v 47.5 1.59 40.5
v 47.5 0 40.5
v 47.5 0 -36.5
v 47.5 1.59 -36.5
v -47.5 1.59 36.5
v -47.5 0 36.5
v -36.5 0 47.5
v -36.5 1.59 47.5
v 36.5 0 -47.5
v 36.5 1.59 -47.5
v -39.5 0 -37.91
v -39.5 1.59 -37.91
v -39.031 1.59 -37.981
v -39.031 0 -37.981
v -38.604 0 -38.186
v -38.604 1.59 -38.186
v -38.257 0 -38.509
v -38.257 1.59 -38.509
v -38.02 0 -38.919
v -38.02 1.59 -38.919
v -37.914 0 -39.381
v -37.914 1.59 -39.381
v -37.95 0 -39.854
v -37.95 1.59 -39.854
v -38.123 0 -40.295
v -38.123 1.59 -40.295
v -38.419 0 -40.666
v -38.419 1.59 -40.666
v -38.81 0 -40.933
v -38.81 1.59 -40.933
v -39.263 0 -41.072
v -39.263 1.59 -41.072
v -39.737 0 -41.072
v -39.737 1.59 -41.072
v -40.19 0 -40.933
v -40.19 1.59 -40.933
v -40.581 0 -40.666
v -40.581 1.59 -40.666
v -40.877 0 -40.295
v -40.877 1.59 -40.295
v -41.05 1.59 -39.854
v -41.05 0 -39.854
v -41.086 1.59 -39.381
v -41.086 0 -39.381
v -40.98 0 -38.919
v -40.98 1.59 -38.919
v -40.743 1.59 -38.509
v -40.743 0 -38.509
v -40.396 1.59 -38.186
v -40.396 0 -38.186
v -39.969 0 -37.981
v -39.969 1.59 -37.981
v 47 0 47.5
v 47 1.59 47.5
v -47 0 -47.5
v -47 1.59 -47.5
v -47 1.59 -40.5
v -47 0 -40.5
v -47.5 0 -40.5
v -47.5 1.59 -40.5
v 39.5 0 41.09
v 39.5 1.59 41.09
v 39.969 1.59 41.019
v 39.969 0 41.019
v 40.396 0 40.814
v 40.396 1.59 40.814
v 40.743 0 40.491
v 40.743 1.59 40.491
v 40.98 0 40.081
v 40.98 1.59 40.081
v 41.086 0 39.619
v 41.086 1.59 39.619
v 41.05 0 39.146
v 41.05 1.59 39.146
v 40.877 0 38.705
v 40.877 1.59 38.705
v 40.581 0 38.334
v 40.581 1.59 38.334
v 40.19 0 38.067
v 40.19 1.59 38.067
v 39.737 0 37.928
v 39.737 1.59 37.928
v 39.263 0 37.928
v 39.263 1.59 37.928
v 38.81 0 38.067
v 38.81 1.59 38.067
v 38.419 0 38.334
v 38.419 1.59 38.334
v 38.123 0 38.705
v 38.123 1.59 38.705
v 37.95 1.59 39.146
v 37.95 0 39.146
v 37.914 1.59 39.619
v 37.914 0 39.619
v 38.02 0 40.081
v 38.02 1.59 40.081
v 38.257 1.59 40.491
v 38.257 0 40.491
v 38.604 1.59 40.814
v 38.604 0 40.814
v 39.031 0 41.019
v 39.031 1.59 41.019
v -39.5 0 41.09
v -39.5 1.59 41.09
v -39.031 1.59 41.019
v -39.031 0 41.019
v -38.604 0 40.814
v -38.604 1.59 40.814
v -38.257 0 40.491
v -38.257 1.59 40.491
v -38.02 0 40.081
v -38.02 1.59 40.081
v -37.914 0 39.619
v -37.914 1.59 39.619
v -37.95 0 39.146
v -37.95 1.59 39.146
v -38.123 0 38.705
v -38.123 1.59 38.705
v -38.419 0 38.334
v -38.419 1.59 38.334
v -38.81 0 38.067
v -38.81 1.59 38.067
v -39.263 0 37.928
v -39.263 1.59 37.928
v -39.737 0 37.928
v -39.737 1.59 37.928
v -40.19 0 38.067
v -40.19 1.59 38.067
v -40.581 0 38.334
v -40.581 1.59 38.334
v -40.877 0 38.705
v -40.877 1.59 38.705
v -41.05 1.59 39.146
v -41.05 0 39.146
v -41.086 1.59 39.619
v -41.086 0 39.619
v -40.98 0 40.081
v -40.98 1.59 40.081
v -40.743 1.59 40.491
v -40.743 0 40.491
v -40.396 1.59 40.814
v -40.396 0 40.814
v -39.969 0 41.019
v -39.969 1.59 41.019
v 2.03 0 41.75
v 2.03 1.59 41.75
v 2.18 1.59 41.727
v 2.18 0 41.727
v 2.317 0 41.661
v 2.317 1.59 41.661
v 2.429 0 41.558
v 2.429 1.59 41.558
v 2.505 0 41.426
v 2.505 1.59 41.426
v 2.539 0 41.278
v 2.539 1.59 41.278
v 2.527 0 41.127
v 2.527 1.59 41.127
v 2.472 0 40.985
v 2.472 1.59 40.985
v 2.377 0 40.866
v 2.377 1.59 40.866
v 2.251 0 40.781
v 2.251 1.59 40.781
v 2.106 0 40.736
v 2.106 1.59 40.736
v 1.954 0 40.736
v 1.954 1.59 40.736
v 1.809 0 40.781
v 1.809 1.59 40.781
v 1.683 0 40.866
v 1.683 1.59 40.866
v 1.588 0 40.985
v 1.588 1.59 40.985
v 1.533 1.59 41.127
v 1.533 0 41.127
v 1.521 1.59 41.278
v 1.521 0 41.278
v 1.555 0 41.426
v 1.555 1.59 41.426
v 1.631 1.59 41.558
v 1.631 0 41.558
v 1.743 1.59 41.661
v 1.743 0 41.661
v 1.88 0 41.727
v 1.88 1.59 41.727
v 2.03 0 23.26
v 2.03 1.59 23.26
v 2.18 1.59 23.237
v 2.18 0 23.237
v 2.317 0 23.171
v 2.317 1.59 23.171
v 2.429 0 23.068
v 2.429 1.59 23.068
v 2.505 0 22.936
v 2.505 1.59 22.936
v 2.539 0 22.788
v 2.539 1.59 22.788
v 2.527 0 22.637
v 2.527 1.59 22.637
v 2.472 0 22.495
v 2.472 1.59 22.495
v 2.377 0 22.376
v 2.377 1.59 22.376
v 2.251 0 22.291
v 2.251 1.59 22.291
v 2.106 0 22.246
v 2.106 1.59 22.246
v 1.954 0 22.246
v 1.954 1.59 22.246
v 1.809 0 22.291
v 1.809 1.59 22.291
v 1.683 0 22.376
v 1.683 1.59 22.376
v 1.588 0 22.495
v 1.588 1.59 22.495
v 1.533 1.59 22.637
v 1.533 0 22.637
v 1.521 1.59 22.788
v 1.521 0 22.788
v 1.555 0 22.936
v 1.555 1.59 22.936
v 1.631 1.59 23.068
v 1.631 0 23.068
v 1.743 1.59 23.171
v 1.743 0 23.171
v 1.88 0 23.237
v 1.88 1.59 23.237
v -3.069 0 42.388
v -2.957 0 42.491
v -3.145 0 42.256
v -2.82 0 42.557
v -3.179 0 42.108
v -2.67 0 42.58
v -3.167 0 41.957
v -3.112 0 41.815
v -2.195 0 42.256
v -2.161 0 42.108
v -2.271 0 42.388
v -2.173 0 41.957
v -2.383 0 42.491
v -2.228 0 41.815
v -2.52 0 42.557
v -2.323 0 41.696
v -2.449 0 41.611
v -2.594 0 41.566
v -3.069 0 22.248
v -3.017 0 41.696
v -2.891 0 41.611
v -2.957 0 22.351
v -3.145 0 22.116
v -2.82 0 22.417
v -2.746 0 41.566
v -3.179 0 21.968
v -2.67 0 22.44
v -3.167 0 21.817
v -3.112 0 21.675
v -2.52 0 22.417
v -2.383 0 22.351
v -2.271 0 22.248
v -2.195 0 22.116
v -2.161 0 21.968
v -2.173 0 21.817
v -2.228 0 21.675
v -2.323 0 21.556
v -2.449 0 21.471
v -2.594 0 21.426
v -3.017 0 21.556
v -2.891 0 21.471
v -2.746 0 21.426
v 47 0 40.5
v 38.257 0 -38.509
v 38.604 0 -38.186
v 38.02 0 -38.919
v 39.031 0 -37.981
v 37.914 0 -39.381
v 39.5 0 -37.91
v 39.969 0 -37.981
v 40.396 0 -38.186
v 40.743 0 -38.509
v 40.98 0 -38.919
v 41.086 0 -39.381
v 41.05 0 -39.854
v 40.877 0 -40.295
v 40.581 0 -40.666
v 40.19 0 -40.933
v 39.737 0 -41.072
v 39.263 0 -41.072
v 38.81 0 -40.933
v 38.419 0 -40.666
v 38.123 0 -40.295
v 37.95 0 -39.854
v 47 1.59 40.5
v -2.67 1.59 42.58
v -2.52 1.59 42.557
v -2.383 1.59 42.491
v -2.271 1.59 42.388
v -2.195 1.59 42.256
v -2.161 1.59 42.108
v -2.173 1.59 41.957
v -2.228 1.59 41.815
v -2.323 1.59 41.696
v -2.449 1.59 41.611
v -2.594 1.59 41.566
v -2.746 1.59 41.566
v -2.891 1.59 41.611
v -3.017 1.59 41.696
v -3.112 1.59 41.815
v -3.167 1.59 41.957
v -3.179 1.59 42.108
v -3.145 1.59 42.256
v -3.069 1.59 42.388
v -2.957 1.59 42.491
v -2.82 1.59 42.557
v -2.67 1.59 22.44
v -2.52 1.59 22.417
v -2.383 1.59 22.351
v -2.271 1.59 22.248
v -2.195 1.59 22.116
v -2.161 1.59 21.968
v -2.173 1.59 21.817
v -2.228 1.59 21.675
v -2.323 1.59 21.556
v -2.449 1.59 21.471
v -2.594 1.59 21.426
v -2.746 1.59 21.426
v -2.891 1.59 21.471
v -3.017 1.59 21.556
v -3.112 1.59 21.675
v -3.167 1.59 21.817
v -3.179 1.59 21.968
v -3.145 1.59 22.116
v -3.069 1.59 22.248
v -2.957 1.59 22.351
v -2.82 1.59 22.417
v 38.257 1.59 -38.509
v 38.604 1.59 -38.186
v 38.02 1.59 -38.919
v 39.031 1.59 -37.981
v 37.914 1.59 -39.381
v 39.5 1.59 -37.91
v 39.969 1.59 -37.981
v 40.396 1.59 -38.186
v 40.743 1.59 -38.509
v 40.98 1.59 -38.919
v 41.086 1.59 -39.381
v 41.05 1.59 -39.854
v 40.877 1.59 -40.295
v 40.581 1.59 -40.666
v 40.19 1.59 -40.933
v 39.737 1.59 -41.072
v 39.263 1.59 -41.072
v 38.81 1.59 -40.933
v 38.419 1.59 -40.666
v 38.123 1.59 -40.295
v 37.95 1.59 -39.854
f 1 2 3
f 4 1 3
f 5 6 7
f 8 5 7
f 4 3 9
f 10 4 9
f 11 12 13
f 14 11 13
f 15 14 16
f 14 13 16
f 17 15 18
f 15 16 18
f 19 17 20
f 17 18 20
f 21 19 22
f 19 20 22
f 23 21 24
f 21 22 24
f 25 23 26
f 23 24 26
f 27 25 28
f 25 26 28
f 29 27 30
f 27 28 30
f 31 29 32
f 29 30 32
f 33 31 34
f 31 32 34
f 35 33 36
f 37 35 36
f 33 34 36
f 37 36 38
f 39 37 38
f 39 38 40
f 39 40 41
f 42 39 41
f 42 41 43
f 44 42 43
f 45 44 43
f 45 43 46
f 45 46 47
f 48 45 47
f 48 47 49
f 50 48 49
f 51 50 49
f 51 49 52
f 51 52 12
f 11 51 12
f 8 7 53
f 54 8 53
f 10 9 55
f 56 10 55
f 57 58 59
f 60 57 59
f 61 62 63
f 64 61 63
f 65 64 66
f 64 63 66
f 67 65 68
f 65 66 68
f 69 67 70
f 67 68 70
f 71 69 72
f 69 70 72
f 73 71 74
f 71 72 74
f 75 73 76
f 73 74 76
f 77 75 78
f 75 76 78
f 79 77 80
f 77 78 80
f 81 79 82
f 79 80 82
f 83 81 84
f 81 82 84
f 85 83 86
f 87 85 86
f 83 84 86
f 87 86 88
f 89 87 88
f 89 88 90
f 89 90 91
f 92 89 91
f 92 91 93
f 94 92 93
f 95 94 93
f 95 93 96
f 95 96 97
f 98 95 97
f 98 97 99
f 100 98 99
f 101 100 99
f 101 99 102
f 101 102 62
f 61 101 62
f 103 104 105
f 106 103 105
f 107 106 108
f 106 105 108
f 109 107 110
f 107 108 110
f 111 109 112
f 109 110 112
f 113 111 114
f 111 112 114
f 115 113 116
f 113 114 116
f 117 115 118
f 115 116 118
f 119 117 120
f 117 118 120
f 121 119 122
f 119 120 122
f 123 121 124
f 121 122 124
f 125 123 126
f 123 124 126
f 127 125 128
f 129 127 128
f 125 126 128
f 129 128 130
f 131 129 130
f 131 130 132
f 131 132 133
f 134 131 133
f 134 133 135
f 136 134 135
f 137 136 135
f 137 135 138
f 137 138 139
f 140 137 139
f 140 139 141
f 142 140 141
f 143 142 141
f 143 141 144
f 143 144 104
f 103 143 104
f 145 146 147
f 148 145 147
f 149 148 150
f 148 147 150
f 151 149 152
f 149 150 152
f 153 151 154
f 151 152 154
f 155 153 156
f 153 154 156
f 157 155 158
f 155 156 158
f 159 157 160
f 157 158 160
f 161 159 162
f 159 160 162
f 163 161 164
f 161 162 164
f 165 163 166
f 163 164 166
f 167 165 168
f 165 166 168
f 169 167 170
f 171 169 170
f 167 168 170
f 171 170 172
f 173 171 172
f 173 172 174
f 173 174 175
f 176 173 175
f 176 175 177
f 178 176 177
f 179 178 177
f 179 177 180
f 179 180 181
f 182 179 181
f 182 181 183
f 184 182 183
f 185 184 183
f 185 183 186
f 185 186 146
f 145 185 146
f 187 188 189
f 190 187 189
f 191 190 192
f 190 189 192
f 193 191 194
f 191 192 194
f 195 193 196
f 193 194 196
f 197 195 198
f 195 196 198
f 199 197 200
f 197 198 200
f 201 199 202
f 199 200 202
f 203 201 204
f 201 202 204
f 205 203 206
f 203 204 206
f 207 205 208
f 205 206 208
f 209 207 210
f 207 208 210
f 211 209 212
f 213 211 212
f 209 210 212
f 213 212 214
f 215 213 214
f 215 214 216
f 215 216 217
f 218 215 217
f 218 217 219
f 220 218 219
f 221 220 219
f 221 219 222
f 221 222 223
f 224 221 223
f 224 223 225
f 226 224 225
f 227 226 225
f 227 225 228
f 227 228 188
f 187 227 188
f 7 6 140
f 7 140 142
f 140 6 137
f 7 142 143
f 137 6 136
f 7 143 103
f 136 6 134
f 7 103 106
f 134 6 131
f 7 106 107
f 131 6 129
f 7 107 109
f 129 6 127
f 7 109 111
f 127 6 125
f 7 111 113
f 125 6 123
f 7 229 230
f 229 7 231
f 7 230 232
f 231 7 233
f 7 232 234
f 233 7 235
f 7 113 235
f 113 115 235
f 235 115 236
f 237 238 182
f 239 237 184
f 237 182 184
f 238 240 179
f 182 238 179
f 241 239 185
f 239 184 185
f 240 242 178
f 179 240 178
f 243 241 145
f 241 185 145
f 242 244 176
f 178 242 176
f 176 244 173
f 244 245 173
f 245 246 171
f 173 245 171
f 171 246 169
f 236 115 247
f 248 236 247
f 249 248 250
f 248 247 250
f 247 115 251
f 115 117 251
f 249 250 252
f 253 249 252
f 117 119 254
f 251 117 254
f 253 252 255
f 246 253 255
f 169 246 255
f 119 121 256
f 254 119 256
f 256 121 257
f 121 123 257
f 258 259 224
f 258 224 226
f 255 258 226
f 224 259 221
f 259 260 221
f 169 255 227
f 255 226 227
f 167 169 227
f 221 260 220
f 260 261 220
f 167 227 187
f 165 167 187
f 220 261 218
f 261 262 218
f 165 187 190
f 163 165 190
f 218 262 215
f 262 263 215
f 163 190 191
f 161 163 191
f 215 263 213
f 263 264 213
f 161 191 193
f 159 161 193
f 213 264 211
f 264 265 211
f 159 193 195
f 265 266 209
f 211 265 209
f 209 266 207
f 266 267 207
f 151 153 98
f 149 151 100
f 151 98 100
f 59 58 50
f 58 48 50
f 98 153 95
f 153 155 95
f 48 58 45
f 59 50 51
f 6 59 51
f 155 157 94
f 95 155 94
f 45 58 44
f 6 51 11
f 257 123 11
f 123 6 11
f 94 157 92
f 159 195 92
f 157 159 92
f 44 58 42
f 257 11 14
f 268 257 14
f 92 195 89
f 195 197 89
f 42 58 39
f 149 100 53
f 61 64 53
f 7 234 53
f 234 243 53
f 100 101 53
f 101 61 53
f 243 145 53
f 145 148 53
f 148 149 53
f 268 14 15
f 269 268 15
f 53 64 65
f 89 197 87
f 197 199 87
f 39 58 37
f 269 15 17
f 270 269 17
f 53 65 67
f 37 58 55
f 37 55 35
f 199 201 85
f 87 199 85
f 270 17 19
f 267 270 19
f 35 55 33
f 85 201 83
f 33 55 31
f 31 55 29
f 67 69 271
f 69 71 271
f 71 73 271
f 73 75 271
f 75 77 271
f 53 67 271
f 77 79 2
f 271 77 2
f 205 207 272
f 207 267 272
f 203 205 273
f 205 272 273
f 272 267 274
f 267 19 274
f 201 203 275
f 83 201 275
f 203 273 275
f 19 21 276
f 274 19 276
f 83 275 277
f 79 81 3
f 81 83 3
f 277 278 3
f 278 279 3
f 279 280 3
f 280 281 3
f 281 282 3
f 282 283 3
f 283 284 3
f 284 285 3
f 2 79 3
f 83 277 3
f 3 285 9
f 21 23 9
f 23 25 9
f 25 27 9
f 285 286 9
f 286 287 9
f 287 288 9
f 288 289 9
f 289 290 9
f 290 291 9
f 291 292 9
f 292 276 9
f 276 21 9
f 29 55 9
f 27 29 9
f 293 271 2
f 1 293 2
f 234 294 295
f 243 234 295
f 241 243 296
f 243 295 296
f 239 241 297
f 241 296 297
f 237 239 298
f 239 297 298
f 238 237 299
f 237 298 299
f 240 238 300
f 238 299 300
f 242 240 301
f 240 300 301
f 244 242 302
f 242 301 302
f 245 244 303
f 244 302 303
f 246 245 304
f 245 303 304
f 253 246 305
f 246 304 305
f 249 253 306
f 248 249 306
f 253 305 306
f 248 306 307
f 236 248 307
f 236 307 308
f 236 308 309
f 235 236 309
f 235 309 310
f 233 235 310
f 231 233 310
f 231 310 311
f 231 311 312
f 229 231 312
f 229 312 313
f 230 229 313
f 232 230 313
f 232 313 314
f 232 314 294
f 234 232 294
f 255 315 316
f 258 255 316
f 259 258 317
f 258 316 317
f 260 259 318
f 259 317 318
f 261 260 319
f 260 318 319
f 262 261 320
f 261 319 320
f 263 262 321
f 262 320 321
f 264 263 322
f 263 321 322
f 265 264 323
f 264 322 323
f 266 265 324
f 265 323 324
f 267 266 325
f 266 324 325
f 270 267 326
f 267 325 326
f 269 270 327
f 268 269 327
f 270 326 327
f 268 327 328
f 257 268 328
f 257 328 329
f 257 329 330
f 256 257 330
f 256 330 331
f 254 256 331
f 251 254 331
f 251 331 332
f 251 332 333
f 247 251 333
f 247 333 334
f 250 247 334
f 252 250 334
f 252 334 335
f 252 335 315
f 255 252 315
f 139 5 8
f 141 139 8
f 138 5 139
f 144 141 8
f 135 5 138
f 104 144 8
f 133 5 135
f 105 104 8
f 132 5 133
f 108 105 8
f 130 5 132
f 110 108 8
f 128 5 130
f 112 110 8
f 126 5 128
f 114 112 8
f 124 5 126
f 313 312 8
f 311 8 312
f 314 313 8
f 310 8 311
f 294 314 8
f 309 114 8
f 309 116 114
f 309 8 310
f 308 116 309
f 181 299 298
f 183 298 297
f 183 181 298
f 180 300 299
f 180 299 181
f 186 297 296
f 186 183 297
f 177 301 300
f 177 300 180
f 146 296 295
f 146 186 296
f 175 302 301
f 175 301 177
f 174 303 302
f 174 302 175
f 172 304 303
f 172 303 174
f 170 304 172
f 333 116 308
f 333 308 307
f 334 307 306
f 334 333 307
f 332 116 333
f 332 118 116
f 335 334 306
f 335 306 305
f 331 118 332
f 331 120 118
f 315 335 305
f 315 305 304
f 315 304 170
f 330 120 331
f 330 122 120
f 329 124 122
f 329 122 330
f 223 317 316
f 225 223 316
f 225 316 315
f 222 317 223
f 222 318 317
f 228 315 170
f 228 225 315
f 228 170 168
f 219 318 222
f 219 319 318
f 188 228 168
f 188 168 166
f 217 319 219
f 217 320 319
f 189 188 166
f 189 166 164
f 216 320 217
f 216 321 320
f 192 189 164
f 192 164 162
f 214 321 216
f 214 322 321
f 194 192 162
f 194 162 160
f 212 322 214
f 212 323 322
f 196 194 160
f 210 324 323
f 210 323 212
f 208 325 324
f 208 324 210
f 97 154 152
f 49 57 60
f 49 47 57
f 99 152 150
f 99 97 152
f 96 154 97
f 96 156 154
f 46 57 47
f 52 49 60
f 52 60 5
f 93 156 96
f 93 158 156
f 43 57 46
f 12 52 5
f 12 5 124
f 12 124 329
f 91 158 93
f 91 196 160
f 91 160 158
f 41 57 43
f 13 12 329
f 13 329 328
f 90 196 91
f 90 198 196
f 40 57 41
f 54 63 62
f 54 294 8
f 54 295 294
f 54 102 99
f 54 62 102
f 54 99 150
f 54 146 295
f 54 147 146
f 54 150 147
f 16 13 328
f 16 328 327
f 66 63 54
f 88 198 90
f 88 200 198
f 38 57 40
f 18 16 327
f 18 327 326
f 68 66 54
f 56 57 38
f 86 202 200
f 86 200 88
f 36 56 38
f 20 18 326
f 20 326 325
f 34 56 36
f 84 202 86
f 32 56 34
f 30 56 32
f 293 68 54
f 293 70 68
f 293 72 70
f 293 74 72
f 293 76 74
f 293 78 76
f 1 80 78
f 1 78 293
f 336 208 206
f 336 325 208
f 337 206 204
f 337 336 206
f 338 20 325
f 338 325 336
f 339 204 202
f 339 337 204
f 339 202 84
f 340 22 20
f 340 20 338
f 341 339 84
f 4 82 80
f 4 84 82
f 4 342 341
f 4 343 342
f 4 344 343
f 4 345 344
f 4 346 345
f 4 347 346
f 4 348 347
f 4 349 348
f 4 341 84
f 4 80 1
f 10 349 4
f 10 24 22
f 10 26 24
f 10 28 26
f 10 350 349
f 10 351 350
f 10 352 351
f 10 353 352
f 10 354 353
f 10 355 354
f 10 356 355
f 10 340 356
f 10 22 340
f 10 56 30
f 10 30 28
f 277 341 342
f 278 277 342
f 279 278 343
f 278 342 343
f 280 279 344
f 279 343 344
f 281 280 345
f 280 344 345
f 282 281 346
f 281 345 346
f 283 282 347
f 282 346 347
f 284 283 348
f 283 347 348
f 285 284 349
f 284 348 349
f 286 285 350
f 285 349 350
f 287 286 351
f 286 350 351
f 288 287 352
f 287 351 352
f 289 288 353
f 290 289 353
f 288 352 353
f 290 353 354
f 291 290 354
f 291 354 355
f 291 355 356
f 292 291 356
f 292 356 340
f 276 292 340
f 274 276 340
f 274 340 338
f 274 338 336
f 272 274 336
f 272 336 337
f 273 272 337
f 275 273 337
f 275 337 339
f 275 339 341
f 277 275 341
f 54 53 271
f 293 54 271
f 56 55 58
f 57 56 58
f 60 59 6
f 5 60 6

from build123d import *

# Parameters (mm, degrees)
BOSS_EXTRUDE1_DEPTH = 1.59
SKETCH2_R           = 1.59
SKETCH2_R_2         = 0.51
CUT_EXTRUDE1_DEPTH  = 68.193958806


with BuildPart() as part:
    # Sketch1 → Boss-Extrude1 (new body)
    with BuildSketch(Plane(origin=(0, 0, 0), x_dir=(1, 0, 0), z_dir=(0, 1, 0))):
        Polygon((-47.5, -36.5), (-36.5, -47.5), (47, -47.5), (47, -40.5), (47.5, -40.5), (47.5, 36.5), (36.5, 47.5), (-47, 47.5), (-47, 40.5), (-47.5, 40.5), align=None)
    extrude(amount=BOSS_EXTRUDE1_DEPTH)

    # Sketch2 → Cut-Extrude1 (cut, through all)
    with BuildSketch(Plane(origin=(0, 1.59, 0), x_dir=(1, 0, 0), z_dir=(0, 1, 0))):
        with Locations(Location((-39.5, -39.5, 0), (0, 0, 270))):
            Circle(SKETCH2_R)
        with Locations(Location((-39.5, 39.5, 0), (0, 0, 270))):
            Circle(SKETCH2_R)
        with Locations(Location((39.5, 39.5, 0), (0, 0, 270))):
            Circle(SKETCH2_R)
        with Locations(Location((39.5, -39.5, 0), (0, 0, 270))):
            Circle(SKETCH2_R)
        with Locations(Location((-2.67, -21.93, 0), (0, 0, 270))):
            Circle(SKETCH2_R_2)
        with Locations(Location((2.03, -22.75, 0), (0, 0, 270))):
            Circle(SKETCH2_R_2)
        with Locations(Location((-2.67, -42.07, 0), (0, 0, 270))):
            Circle(SKETCH2_R_2)
        with Locations(Location((2.03, -41.24, 0), (0, 0, 270))):
            Circle(SKETCH2_R_2)
    extrude(amount=-CUT_EXTRUDE1_DEPTH, mode=Mode.SUBTRACT)


solid = part.part
